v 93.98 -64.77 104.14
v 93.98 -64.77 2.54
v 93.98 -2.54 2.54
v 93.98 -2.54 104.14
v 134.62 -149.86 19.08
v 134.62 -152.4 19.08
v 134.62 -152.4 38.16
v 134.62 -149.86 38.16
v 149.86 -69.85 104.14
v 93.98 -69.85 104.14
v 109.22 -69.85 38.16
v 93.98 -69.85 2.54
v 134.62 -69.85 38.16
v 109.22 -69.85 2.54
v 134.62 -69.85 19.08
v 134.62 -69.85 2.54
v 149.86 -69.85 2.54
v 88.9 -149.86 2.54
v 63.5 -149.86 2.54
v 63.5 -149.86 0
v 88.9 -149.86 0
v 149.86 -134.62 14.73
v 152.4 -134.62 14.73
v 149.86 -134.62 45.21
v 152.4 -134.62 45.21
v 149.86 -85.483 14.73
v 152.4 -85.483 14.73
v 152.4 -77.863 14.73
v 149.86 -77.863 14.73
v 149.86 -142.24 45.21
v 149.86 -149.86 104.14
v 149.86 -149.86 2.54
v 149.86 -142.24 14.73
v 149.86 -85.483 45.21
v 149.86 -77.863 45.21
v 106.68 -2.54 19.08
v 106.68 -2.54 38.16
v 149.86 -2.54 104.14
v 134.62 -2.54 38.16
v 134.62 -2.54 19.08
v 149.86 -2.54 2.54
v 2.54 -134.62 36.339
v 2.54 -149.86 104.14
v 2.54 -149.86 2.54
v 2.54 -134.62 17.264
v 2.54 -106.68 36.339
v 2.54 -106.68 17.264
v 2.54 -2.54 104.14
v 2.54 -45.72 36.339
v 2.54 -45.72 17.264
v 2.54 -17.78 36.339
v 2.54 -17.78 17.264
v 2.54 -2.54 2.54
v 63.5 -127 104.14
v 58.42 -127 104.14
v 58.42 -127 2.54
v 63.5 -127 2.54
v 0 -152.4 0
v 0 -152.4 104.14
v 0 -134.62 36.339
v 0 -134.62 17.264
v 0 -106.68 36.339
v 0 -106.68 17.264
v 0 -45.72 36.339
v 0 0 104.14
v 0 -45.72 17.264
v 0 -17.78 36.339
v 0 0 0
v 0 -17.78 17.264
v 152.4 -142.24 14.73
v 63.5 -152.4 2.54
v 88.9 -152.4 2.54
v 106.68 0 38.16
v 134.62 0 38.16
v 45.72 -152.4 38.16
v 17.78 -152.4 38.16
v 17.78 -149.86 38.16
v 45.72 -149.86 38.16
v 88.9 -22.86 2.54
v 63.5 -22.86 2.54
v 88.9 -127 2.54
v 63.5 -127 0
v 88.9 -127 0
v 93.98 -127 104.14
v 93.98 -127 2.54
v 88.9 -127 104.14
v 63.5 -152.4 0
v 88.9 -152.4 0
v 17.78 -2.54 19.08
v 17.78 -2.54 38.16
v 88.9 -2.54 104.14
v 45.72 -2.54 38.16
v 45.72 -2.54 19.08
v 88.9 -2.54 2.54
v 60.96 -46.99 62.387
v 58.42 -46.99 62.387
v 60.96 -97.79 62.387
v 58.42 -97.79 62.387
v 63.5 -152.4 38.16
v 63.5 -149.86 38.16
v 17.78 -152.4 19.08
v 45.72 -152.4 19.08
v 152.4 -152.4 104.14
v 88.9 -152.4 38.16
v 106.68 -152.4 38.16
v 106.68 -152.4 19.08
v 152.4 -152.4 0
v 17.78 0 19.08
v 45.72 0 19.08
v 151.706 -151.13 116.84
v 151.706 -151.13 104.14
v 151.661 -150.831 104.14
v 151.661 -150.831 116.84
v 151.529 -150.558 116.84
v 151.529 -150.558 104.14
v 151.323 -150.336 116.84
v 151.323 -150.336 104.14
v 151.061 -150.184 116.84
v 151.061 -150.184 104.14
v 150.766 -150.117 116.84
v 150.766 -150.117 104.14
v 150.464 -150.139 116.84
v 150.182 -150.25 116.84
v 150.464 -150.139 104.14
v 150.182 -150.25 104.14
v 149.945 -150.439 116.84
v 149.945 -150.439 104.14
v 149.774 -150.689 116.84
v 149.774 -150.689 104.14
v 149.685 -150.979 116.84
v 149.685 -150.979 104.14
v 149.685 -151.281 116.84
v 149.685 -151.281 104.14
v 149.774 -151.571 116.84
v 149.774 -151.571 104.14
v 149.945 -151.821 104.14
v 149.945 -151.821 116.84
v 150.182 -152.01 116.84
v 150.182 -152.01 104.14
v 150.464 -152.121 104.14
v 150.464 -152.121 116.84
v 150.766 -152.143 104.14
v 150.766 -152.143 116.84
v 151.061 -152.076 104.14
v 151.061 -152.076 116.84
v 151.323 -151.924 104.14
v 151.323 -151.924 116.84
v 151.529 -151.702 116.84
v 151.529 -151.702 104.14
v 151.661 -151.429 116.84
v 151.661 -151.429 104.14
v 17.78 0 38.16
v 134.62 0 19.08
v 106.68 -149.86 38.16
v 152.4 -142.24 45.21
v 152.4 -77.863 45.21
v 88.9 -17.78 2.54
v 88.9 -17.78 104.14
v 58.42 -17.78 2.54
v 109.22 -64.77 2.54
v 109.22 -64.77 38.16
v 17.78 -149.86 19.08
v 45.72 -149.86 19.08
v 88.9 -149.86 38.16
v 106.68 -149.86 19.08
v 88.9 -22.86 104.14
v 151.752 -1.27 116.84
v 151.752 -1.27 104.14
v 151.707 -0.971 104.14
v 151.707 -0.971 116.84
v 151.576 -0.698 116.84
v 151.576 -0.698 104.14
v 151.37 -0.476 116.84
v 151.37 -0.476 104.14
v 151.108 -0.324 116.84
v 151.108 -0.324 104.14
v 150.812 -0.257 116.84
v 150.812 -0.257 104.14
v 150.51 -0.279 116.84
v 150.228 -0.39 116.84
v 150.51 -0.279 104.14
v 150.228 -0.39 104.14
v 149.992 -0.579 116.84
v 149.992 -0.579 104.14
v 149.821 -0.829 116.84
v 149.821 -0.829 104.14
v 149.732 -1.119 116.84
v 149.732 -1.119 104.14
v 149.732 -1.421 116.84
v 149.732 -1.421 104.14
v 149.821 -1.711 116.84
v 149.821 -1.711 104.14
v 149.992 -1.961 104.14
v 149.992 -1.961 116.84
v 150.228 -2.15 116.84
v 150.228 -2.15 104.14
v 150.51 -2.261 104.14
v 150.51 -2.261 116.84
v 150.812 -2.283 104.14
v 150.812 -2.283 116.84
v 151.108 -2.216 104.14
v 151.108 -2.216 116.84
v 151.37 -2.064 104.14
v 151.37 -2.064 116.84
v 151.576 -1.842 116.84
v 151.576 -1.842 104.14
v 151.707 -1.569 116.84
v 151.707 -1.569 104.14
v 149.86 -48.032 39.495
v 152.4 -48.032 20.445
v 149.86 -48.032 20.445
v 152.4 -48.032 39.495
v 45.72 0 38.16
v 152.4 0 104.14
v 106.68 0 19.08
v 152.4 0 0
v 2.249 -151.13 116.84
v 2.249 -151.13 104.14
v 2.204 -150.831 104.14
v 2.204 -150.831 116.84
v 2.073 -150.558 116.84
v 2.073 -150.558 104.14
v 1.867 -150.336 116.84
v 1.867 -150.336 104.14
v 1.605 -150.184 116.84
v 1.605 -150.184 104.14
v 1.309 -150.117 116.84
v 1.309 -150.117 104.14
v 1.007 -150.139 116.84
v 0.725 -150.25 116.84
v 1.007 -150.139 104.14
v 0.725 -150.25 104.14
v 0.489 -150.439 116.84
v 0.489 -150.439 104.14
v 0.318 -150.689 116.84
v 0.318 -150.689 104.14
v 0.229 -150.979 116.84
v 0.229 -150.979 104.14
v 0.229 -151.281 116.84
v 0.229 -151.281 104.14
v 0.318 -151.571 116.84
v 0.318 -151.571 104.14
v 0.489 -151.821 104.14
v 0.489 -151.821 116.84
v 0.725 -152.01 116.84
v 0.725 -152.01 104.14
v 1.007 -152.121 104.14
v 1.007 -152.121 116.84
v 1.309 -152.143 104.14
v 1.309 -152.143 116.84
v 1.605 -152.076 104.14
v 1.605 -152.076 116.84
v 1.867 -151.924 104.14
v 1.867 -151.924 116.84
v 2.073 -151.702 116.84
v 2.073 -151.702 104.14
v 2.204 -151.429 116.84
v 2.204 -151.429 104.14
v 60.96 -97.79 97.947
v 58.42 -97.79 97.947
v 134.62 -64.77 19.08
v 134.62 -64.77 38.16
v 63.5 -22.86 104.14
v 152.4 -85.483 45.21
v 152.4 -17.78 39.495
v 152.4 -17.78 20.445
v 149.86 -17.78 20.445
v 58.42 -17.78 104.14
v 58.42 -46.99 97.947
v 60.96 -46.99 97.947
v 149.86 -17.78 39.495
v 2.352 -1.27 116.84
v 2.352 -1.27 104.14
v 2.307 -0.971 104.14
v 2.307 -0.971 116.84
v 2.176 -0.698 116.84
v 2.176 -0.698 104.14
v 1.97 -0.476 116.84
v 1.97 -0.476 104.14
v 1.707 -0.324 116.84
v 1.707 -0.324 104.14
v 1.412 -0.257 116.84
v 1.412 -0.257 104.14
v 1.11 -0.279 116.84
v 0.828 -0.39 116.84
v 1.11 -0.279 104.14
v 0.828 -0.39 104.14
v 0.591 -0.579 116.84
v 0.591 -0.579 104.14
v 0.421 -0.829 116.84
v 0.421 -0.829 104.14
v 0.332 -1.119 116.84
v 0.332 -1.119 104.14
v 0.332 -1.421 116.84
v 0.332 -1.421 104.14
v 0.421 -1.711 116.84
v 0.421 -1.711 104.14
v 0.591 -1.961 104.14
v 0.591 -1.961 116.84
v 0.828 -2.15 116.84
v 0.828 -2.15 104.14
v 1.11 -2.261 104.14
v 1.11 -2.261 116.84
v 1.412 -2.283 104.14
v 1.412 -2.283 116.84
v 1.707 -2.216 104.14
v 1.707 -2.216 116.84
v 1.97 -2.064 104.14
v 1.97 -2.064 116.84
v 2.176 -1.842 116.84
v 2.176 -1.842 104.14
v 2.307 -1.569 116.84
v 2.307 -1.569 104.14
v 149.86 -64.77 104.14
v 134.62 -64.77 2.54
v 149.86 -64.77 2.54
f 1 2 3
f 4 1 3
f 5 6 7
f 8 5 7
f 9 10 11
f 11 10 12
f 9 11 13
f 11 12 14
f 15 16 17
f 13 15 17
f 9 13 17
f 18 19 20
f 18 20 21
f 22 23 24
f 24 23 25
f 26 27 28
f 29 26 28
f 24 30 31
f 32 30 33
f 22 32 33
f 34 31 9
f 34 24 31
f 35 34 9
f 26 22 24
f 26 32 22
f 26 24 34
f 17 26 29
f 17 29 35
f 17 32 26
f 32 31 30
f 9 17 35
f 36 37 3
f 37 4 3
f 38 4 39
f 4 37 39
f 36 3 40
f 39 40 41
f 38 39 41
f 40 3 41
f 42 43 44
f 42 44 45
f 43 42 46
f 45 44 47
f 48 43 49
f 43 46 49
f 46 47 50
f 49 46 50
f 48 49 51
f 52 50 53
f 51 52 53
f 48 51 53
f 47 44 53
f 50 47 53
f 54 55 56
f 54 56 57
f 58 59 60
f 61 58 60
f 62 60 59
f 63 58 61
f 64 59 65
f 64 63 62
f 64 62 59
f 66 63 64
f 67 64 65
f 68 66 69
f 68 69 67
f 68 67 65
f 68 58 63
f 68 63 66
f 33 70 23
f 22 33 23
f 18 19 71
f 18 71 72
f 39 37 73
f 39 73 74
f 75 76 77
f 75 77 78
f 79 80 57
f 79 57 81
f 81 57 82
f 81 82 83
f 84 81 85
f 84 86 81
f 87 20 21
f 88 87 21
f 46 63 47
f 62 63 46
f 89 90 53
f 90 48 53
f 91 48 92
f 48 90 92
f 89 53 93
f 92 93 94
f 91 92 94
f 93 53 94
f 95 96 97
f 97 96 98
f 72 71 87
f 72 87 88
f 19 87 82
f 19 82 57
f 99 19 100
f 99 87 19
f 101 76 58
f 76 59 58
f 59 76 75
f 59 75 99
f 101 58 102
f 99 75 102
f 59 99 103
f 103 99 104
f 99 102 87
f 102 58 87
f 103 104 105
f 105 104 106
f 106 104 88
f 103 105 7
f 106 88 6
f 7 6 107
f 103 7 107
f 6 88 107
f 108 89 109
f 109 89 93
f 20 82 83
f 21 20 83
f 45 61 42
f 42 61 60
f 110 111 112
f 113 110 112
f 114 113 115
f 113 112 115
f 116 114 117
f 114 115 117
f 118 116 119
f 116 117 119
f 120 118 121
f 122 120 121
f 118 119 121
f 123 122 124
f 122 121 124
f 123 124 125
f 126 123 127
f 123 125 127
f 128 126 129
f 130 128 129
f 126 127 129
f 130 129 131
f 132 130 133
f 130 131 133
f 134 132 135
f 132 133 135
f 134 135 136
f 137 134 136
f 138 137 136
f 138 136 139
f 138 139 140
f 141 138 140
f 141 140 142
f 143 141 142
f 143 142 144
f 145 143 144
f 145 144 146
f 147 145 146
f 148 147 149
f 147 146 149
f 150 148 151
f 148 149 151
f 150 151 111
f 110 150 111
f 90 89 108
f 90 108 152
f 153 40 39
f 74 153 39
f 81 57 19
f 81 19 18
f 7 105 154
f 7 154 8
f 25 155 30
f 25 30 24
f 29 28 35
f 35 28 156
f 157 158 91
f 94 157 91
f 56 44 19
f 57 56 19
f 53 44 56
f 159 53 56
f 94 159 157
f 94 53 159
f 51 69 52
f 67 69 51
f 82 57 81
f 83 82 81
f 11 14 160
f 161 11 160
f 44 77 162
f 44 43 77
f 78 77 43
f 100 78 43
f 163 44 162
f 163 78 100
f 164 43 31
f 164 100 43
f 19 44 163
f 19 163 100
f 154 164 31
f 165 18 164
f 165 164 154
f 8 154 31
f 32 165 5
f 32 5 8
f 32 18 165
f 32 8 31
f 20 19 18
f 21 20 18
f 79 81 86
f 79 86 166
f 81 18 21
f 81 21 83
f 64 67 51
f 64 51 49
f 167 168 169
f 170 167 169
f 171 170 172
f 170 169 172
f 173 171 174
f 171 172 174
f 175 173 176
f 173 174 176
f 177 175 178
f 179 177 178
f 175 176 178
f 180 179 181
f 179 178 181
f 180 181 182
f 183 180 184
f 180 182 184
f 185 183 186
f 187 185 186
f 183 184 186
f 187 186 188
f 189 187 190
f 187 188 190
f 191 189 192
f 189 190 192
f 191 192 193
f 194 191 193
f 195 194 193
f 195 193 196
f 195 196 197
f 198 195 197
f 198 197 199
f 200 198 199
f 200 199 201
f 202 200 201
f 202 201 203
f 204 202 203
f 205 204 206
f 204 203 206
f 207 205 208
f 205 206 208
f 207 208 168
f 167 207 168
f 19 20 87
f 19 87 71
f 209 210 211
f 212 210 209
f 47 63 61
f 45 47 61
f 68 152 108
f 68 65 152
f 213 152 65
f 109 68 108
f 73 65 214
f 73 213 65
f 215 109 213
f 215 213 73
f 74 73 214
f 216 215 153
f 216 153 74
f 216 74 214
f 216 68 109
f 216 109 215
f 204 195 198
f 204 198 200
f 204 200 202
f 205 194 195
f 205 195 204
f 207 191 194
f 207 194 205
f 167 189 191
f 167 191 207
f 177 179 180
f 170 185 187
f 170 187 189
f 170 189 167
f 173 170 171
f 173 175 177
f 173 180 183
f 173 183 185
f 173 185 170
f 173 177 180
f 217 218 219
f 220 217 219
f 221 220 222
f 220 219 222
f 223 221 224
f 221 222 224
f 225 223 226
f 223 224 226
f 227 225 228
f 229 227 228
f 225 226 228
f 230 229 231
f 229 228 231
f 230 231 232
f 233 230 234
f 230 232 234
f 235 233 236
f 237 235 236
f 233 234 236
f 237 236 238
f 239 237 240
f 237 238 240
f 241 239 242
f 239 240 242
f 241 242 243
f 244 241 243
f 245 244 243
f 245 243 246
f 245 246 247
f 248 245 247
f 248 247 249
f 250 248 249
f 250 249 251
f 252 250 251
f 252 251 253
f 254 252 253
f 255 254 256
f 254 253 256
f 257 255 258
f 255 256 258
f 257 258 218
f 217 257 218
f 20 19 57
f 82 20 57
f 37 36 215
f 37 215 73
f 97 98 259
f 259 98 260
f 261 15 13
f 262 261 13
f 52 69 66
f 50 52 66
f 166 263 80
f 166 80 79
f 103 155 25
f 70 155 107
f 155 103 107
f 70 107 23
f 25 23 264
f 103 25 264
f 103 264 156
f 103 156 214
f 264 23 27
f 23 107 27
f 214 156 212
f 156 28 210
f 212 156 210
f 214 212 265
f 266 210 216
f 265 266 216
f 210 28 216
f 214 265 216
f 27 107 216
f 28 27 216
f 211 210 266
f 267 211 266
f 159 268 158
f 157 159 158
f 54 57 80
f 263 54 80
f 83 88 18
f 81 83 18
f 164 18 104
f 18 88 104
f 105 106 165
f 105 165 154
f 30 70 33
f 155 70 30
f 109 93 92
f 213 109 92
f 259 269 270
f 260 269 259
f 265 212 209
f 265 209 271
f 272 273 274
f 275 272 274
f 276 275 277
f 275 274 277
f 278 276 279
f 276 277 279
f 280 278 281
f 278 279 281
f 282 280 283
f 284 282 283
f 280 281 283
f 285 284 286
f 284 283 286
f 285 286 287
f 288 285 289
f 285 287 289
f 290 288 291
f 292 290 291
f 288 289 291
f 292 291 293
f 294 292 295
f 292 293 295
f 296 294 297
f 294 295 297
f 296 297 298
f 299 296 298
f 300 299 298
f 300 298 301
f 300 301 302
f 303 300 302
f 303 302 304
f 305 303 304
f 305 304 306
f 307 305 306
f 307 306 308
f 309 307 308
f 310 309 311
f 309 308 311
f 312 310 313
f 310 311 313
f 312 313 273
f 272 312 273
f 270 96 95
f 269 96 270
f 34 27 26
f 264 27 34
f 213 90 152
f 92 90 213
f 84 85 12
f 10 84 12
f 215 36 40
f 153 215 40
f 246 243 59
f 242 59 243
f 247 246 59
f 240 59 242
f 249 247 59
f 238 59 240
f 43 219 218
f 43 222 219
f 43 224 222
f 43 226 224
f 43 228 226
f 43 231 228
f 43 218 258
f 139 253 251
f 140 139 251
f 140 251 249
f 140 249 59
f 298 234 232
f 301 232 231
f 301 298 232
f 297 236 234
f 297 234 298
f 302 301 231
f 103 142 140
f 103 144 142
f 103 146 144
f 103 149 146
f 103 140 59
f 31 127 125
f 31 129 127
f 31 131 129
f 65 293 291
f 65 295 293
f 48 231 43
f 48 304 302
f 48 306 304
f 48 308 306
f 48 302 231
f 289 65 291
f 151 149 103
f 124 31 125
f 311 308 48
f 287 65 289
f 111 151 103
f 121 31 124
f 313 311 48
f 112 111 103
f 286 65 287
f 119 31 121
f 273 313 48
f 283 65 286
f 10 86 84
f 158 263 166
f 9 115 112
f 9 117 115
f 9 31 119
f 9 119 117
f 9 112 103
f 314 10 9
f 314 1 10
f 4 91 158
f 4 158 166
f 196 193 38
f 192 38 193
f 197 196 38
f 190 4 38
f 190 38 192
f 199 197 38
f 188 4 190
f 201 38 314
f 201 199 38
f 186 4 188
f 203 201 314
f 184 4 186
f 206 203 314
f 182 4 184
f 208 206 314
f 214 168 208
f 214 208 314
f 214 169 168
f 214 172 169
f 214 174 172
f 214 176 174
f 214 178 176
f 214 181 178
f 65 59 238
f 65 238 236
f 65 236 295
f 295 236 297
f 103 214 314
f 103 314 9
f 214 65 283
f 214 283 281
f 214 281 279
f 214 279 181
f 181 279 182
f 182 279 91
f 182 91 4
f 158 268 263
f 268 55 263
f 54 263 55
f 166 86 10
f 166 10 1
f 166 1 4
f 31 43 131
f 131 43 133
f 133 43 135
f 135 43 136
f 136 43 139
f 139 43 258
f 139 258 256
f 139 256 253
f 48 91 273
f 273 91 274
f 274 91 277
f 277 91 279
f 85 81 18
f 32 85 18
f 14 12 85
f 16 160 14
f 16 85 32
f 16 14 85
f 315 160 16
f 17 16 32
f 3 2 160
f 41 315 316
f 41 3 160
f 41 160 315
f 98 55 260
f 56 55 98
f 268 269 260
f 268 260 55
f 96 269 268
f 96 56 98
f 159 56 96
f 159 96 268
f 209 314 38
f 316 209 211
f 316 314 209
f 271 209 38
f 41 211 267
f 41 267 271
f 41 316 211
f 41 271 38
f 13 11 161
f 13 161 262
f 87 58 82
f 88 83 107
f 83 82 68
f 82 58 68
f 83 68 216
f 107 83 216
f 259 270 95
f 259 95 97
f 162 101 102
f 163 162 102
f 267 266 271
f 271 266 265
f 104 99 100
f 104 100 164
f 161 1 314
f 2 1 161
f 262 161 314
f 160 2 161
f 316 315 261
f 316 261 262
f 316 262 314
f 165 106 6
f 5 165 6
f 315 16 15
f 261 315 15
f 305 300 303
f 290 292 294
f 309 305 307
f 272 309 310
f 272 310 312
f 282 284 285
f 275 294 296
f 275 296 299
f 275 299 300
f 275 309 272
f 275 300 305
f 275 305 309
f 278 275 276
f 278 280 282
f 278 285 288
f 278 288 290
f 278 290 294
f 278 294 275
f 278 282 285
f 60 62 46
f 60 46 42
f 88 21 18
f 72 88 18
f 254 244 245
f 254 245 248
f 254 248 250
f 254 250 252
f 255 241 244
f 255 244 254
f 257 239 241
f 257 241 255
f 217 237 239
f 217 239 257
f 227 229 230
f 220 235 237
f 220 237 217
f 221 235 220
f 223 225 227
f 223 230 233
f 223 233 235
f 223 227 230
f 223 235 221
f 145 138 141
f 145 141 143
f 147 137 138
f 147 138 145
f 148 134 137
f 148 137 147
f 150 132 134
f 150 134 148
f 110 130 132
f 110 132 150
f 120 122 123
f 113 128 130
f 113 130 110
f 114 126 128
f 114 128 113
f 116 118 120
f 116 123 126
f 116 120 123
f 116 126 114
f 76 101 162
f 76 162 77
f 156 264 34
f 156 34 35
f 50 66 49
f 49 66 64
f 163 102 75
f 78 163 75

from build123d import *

# Parameters (mm, degrees)
F0_W      = 152.4
F0_H      = 152.4
F1_DEPTH  = 2.54
F2_W      = 152.4
F2_H      = 152.4
F2_W_2    = 147.32
F2_H_2    = 147.32
F3_DEPTH  = 101.6
F4_W      = 25.4
F4_H      = 38.1600596011
F5_DEPTH  = 25.4
F6_W      = 25.4
F6_H      = 22.86
F7_DEPTH  = 2.54
F8_W      = 25.4
F8_H      = 2.54
F9_DEPTH  = 2.54
F11_W     = 5.08
F11_H     = 109.22
F11_H_2   = 124.4600435235
F12_DEPTH = 101.6
F13_W     = 25.4
F13_H     = 5.08
F14_DEPTH = 101.6
F15_W     = 50.8
F15_H     = 35.56
F16_DEPTH = 2.54
F17_W     = 55.8800075936
F17_H     = 5.08
F18_DEPTH = 101.6
F20_DEPTH = 5.08
F22_W     = 7.62
F22_H     = 30.48
F23_DEPTH = 25.4
F24_W     = 30.2523560822
F24_H     = 19.05
F25_DEPTH = 25.4
F21_W     = 27.94
F21_H     = 19.0800298005
F26_DEPTH = 254
F27_DEPTH = 254
F28_W     = 2.5399962032
F28_H     = 5.08
F29_DEPTH = 25.4
F30_W     = 27.94
F30_H     = 19.0754
F31_DEPTH = 25.4
F34_R     = 1.016
F35_DEPTH = 12.7


with BuildPart() as f1:
    # F0 (on Top) → F1 (new body)
    with BuildSketch(Plane.XY):
        with Locations((76.2, -76.2)):
            Rectangle(F0_W, F0_H)
    extrude(amount=F1_DEPTH)

    # F2 (on face) → F3 (join)
    with BuildSketch(Plane.XY.offset(2.54)):
        with Locations((76.2, -76.2)):
            Rectangle(F2_W, F2_H)
        with Locations((76.2, -76.2)):
            Rectangle(F2_W_2, F2_H_2, mode=Mode.SUBTRACT)
    extrude(amount=F3_DEPTH)

    # F4 (on face) → F5 (cut)
    with BuildSketch(Plane.XZ.offset(152.4)):
        with Locations((76.2, 19.0800298005)):
            Rectangle(F4_W, F4_H)
    extrude(amount=-F5_DEPTH, mode=Mode.SUBTRACT)

    # F11 (on face) → F12 (join)
    with BuildSketch(Plane.XY.offset(2.54)):
        with Locations((60.96, -72.39)):
            Rectangle(F11_W, F11_H)
        with Locations((91.4399924064, -64.7699782383)):
            Rectangle(F11_W, F11_H_2)
    extrude(amount=F12_DEPTH)

    # F13 (on face) → F14 (join)
    with BuildSketch(Plane.XY.offset(104.14)):
        with Locations((76.2, -20.32)):
            Rectangle(F13_W, F13_H)
    extrude(amount=-F14_DEPTH)

    # F15 (on face) → F16 (cut)
    with BuildSketch(Plane(origin=(58.42, 0, 0), x_dir=(0, -1, 0), z_dir=(-1, 0, 0))):
        with Locations((72.39, 80.1668018103)):
            Rectangle(F15_W, F15_H)
    extrude(amount=-F16_DEPTH, mode=Mode.SUBTRACT)

    # F17 (on face) → F18 (join)
    with BuildSketch(Plane.XY.offset(104.14)):
        with Locations((121.9199962032, -67.31)):
            Rectangle(F17_W, F17_H)
    extrude(amount=-F18_DEPTH)

    # F19 (on face) → F20 (cut)
    with BuildSketch(Plane.XZ.offset(69.85)):
        Polygon((109.2199962032, 2.54), (121.9199962032, 2.54), (134.6199962032, 2.54), (134.6199962032, 38.1), (109.2199962032, 38.1), align=None)
    extrude(amount=-F20_DEPTH, mode=Mode.SUBTRACT)

    # F22 (on face) → F23 (cut)
    with BuildSketch(Plane.YZ.offset(152.4)):
        with Locations((-138.43, 29.9698188901)):
            Rectangle(F22_W, F22_H)
        with Locations((-81.6729860806, 29.9698188901)):
            Rectangle(F22_W, F22_H)
    extrude(amount=-F23_DEPTH, mode=Mode.SUBTRACT)

    # F24 (on face) → F25 (cut)
    with BuildSketch(Plane.YZ.offset(152.4)):
        with Locations((-32.9061780411, 29.9698188901)):
            Rectangle(F24_W, F24_H)
    extrude(amount=-F25_DEPTH, mode=Mode.SUBTRACT)

    # F21 (on face) → F26 (cut)
    with BuildSketch(Plane.XZ.offset(152.4)):
        with Locations((31.75, 28.6200447008)):
            Rectangle(F21_W, F21_H)
    extrude(amount=-F26_DEPTH, mode=Mode.SUBTRACT)

    # F21 (on face) → F27 (cut)
    with BuildSketch(Plane.XZ.offset(152.4)):
        with Locations((120.65, 28.6200447008)):
            Rectangle(F21_W, F21_H)
    extrude(amount=-F27_DEPTH, mode=Mode.SUBTRACT)

    # F28 (on face) → F29 (join)
    with BuildSketch(Plane.XY.offset(19.0800298005)):
        with Locations((107.9499981016, -67.31)):
            Rectangle(F28_W, F28_H)
    extrude(amount=F29_DEPTH)

    # F30 (on face) → F31 (cut)
    with BuildSketch(Plane(origin=(0, 0, 0), x_dir=(0, -1, 0), z_dir=(-1, 0, 0))):
        with Locations((120.65, 26.8014365758)):
            Rectangle(F30_W, F30_H)
        with Locations((31.75, 26.8014365758)):
            Rectangle(F30_W, F30_H)
    extrude(amount=-F31_DEPTH, mode=Mode.SUBTRACT)

    # F34 (on face) → F35 (join)
    with BuildSketch(Plane.XY.offset(104.14)):
        with Locations((1.2333957711, -151.13)):
            Circle(F34_R)
        with Locations((1.3362482423, -1.27)):
            Circle(F34_R)
        with Locations((150.7363170385, -1.27)):
            Circle(F34_R)
        with Locations((150.6897211075, -151.13)):
            Circle(F34_R)
    extrude(amount=F35_DEPTH)


with BuildPart() as f7:
    # F6 (on face) → F7 (new body)
    with BuildSketch(Plane.XY.offset(2.54)):
        with Locations((76.2, -138.43)):
            Rectangle(F6_W, F6_H)
    extrude(amount=-F7_DEPTH)


with BuildPart() as f9:
    # F8 (on face) → F9 (new body)
    with BuildSketch(Plane.XZ.offset(149.86)):
        with Locations((76.2, 1.27)):
            Rectangle(F8_W, F8_H)
    extrude(amount=F9_DEPTH)


solid = Compound([f1.part, f7.part, f9.part])
